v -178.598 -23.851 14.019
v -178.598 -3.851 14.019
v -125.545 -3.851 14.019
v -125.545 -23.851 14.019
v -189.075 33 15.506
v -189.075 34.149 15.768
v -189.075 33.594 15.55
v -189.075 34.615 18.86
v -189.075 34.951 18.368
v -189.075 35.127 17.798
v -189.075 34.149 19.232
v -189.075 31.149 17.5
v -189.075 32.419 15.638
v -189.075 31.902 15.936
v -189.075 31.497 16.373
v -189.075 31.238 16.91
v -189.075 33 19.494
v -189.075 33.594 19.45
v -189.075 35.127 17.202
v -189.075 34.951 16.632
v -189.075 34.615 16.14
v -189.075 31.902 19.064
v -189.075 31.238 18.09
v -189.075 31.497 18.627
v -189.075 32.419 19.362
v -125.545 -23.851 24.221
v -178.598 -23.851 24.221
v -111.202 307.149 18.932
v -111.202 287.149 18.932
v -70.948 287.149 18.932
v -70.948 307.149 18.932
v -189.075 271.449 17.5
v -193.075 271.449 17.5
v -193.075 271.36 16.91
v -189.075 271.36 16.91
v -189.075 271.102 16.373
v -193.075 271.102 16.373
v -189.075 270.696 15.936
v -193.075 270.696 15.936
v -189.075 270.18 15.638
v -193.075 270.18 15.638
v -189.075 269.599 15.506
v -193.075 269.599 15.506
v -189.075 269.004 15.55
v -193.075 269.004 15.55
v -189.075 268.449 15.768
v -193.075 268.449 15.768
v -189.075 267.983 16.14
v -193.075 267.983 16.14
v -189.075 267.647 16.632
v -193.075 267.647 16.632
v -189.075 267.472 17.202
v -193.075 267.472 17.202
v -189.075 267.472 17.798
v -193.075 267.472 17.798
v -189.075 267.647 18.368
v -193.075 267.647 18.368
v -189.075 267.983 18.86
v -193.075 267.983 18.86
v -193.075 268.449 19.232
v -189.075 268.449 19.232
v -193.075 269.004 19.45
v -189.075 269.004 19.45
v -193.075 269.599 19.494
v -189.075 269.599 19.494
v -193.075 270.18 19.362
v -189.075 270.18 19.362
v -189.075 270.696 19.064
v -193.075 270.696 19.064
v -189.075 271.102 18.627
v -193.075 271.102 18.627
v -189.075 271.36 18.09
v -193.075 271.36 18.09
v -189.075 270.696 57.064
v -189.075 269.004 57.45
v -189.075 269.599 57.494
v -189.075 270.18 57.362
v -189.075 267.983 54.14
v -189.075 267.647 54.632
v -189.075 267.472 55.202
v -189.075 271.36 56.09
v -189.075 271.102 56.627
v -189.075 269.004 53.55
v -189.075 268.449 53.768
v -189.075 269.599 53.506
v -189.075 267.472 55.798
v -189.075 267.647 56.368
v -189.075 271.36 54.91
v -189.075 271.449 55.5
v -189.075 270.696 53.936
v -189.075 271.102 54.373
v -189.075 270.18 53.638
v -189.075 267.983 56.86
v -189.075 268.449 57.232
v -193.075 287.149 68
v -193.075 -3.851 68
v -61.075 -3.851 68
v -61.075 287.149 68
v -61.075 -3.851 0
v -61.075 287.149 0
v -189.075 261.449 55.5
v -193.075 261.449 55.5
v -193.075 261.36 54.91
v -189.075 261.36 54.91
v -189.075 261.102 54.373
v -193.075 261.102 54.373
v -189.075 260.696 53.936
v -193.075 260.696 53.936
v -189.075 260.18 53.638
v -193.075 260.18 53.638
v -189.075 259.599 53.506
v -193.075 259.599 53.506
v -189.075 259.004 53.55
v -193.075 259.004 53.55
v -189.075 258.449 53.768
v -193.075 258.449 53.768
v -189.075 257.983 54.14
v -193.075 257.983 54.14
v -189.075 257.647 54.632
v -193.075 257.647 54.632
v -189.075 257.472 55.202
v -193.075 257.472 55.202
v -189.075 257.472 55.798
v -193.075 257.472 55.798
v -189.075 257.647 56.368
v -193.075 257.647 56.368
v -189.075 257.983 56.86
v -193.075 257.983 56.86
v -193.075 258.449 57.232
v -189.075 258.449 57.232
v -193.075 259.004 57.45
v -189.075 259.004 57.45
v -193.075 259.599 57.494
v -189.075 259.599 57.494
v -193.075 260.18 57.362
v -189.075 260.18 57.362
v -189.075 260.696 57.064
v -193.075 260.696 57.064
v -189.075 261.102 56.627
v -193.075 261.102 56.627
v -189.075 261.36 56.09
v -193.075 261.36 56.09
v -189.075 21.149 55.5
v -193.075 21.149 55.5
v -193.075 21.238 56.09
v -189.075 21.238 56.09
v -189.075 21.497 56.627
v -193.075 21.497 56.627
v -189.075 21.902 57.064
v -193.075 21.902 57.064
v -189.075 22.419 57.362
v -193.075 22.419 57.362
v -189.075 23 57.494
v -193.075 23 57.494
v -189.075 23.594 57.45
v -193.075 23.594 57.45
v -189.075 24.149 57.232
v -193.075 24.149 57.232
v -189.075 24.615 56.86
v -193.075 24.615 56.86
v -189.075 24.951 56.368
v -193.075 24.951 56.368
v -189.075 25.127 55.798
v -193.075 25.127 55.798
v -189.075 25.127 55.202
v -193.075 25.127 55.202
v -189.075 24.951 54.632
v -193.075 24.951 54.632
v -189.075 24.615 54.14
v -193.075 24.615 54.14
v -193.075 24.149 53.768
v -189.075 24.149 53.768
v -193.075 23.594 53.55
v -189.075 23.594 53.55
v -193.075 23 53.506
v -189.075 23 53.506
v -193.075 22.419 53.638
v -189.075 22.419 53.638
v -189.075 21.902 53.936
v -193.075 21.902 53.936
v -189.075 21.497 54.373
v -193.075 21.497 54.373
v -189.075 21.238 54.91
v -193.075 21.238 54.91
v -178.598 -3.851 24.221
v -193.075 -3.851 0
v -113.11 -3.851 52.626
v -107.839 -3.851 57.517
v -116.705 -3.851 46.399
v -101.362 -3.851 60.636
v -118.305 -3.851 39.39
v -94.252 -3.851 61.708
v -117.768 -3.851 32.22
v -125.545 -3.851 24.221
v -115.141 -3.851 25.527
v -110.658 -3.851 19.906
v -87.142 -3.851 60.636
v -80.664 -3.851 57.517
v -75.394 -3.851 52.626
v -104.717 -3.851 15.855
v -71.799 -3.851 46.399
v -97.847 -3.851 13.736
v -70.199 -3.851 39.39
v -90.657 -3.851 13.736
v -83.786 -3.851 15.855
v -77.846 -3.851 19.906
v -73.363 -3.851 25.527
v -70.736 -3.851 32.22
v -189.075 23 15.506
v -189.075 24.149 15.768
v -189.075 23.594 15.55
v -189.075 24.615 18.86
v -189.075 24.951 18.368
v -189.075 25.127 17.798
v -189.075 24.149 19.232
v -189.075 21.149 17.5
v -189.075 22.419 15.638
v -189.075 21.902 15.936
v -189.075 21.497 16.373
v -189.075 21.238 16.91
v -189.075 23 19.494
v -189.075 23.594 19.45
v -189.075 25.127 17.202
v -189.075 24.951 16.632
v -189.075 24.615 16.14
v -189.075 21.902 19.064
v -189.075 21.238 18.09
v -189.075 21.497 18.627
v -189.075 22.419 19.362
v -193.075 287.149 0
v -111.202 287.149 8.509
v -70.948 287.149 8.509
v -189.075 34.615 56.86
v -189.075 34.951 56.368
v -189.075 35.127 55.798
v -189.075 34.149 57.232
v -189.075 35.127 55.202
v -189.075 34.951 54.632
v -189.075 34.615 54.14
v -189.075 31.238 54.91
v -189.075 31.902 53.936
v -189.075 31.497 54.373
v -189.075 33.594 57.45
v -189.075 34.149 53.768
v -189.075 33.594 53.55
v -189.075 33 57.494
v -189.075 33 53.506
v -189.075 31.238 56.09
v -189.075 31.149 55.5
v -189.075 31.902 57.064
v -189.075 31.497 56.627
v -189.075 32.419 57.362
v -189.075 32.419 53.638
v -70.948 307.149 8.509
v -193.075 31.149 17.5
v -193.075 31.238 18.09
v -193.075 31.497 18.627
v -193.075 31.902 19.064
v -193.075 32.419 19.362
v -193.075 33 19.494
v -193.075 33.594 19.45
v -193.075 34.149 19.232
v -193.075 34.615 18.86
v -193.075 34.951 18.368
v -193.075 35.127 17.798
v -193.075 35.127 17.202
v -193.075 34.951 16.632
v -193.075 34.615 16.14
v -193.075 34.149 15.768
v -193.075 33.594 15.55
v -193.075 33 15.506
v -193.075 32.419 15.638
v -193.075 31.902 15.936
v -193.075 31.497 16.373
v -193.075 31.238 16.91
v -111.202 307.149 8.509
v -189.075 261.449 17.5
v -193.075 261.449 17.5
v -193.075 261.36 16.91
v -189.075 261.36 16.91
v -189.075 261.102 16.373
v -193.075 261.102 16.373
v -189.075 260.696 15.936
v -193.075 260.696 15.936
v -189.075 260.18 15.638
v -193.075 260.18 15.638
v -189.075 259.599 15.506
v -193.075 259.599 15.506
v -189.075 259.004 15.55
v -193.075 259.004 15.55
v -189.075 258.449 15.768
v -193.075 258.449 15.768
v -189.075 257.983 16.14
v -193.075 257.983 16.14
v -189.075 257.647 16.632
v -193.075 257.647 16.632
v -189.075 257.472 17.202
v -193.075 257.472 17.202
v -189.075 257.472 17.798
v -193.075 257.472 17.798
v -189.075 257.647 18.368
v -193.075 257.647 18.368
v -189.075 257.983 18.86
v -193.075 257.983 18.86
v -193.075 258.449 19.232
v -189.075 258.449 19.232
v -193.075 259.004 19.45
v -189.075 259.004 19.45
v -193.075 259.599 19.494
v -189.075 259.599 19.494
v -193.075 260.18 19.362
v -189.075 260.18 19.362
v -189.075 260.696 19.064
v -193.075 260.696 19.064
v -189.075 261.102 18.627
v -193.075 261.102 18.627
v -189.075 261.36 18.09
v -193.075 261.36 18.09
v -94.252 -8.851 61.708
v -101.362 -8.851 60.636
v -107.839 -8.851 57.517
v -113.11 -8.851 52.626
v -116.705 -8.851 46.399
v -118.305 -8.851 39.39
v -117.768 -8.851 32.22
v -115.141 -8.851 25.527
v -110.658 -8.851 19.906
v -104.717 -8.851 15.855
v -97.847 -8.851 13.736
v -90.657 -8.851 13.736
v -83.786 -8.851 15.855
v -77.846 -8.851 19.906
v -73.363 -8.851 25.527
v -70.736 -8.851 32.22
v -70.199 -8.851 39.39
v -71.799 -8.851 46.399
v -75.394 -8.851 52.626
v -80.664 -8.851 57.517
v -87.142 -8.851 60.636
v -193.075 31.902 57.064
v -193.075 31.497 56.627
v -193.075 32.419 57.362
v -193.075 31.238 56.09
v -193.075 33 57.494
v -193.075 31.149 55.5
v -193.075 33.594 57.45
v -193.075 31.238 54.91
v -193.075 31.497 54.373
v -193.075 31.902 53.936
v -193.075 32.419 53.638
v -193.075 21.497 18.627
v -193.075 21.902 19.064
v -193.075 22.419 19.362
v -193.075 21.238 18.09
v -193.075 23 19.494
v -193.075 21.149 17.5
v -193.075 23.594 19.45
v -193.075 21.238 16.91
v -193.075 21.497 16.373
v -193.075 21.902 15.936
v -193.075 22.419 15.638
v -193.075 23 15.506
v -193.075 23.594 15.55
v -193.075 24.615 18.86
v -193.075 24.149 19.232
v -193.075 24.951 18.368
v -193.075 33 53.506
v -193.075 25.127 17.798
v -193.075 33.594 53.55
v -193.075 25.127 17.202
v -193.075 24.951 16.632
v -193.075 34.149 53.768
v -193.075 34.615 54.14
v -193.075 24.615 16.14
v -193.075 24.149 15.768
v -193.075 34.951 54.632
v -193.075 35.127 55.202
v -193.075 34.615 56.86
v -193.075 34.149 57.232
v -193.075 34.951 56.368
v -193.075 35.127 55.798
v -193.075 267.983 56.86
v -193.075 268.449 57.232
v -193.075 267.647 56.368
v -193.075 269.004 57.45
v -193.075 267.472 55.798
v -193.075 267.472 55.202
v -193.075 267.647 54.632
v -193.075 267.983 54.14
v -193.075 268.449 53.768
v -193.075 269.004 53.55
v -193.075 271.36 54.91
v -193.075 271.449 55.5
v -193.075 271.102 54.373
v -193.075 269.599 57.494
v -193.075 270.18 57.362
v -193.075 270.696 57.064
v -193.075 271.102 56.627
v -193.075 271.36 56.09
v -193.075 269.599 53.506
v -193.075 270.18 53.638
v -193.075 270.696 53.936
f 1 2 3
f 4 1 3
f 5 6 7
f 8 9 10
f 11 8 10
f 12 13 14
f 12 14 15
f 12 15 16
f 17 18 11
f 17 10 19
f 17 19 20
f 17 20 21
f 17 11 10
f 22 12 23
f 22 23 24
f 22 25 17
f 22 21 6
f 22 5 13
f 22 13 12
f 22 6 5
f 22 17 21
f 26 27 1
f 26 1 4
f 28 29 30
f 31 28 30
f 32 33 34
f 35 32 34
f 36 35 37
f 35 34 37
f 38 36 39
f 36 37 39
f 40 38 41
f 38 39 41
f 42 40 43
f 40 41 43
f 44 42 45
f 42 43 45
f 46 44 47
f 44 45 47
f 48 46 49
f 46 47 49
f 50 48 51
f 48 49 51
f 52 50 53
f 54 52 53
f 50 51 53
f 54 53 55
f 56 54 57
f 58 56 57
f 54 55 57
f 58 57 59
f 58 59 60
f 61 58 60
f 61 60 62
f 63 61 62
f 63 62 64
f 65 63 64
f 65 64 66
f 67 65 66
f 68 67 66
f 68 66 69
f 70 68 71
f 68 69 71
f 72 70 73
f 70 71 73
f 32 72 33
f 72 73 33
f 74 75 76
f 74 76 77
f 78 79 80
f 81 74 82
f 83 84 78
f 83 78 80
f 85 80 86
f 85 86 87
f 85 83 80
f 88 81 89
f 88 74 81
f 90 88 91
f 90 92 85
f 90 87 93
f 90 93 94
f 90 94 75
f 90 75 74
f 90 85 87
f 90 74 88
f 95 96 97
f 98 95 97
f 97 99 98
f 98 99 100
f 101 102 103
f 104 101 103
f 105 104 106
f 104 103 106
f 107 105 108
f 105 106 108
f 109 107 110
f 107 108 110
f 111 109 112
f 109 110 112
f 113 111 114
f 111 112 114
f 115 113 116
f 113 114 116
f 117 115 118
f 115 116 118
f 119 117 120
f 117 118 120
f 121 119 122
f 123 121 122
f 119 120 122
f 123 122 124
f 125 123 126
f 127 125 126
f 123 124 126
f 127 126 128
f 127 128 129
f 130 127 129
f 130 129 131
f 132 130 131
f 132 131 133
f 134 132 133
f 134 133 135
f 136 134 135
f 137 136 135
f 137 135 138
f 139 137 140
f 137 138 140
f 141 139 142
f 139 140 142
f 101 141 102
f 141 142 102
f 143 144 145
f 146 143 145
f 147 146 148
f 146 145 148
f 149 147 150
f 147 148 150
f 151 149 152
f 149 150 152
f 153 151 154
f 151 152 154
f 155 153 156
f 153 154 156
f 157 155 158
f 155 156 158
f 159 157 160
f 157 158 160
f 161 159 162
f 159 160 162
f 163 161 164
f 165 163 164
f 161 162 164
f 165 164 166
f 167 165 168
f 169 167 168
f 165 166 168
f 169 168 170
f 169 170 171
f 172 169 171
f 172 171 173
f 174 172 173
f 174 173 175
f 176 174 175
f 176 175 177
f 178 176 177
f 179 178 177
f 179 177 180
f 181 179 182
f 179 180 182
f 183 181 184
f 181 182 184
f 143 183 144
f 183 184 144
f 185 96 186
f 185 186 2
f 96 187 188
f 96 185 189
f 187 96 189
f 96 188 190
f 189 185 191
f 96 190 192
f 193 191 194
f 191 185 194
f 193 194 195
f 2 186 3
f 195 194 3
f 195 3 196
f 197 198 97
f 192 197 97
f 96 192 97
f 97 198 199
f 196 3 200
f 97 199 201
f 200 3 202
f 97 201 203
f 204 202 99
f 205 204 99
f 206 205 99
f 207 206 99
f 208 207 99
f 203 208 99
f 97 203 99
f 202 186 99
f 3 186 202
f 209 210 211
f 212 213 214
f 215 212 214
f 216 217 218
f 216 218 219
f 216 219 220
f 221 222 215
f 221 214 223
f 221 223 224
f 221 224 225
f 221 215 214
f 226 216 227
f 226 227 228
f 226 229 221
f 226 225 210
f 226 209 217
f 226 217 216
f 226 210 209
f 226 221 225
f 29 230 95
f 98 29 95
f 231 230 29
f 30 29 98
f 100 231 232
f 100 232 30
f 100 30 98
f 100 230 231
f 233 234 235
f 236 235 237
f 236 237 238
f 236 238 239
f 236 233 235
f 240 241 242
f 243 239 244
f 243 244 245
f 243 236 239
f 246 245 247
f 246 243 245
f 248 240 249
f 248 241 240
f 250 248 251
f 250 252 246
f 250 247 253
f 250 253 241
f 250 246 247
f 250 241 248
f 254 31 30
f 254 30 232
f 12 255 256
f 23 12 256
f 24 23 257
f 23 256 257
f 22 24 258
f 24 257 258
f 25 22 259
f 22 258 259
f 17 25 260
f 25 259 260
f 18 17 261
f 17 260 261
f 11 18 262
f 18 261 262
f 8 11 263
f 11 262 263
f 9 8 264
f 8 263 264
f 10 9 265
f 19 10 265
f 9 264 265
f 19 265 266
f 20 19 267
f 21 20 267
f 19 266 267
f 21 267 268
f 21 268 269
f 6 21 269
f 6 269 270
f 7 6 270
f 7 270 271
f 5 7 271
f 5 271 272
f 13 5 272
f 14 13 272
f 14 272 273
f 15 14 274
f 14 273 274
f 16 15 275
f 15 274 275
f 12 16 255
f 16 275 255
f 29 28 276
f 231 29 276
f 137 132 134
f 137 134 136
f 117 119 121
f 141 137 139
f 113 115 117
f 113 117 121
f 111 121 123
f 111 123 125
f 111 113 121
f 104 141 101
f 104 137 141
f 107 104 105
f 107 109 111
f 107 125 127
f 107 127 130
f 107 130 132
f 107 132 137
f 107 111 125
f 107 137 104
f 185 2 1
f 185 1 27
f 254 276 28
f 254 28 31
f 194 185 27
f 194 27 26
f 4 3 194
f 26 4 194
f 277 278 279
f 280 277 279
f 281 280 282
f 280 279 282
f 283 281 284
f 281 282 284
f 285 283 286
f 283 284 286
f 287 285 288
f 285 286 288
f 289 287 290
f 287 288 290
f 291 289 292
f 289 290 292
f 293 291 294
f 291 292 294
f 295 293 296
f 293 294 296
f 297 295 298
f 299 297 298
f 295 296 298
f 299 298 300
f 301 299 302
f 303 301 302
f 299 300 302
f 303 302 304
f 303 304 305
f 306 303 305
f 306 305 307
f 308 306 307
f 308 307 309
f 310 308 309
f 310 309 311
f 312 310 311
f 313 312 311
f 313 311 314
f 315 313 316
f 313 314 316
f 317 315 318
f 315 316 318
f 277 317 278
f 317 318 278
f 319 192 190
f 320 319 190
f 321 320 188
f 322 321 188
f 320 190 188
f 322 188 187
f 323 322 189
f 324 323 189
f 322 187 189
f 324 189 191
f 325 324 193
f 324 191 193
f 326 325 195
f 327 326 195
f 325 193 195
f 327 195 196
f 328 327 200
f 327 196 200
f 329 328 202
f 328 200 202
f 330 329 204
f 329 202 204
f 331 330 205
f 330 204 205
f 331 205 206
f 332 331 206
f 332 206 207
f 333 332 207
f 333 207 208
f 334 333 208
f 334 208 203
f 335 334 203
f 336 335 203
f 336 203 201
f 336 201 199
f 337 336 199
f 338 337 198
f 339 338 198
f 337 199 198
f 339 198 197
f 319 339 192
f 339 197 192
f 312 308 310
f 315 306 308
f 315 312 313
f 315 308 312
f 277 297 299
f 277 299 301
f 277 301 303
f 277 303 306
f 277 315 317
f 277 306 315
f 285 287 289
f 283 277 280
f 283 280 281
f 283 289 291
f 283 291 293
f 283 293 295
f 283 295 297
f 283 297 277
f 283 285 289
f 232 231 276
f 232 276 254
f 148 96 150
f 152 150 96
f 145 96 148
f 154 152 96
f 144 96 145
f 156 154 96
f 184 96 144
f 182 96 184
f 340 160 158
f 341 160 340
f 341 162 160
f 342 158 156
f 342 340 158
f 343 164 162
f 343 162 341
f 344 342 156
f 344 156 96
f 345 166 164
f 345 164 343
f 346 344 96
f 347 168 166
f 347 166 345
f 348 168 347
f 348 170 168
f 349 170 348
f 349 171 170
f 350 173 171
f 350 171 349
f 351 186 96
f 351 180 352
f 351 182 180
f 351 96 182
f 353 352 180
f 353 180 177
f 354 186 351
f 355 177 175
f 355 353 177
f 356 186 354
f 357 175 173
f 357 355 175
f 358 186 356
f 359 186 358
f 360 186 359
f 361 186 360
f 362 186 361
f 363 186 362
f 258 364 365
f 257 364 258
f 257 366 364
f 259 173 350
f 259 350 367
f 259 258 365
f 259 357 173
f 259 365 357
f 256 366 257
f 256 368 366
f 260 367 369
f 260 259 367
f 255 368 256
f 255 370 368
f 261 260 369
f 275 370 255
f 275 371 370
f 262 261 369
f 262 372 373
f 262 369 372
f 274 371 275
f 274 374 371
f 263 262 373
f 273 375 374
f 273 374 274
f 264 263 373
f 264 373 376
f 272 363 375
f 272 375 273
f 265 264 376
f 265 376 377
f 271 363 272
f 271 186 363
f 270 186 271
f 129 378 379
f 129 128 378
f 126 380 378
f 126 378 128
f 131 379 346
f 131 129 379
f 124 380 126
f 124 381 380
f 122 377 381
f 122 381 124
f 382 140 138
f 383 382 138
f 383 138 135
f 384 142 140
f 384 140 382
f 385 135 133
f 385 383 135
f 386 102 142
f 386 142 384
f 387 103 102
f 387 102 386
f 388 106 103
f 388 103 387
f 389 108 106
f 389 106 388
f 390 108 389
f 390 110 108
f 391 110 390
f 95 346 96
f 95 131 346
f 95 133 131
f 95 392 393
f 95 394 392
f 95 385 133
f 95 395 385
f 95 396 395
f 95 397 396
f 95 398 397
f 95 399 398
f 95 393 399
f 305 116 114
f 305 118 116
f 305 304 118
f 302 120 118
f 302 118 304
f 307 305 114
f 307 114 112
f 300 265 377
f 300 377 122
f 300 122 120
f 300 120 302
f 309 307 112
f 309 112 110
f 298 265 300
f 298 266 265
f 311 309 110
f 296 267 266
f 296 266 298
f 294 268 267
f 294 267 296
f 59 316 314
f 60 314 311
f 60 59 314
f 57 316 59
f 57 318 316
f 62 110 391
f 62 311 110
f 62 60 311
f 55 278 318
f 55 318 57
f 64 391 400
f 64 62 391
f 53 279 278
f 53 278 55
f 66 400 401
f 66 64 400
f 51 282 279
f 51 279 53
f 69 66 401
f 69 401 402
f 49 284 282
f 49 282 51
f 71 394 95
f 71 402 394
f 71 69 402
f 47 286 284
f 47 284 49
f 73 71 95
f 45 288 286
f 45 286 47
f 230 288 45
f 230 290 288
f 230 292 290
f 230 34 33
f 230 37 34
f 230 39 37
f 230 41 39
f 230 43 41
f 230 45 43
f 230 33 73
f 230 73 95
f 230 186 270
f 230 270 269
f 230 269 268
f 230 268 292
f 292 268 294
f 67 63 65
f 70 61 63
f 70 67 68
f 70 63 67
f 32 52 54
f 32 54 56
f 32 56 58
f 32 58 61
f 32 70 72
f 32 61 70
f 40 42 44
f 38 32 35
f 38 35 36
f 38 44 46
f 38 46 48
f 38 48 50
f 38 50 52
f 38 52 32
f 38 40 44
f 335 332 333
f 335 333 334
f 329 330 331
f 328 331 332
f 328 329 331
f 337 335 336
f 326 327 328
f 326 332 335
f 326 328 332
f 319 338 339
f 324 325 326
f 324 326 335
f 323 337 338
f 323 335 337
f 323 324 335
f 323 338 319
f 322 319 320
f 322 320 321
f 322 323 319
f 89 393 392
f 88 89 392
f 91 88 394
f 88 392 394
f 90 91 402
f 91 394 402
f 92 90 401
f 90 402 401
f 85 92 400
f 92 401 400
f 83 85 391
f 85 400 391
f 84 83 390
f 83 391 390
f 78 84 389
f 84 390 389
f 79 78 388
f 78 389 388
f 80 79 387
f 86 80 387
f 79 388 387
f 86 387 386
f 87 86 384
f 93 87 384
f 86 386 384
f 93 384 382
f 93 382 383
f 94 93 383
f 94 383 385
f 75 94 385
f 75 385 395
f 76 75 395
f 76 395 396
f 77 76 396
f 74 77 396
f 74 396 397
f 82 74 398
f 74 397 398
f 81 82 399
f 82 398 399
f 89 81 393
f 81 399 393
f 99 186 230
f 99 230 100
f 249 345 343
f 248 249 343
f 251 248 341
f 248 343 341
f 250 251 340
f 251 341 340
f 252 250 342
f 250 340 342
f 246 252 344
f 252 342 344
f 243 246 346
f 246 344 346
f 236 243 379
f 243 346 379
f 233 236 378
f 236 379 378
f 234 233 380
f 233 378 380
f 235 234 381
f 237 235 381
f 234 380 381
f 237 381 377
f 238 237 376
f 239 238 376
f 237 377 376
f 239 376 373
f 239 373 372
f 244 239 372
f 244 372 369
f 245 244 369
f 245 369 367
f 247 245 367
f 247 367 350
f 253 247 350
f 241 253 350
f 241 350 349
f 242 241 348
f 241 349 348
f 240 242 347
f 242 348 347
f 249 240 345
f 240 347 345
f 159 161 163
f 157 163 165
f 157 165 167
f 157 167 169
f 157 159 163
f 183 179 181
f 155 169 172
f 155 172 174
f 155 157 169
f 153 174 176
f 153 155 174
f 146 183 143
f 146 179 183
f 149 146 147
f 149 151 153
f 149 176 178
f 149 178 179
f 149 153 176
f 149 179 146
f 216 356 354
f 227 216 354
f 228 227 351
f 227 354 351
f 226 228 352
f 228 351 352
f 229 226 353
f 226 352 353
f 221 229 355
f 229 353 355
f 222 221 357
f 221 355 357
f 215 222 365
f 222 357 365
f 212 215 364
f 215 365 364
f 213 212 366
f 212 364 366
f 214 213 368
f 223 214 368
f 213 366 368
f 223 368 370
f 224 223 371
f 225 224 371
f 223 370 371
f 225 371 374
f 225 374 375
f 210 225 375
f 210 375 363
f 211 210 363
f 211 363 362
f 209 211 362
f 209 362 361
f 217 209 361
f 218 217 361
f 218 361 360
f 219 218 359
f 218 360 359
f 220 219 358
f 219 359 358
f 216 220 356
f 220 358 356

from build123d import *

# Parameters (mm, degrees)
SKETCH_1_W          = 132
SKETCH_1_H          = 291
EXTRUDE_1_DEPTH     = 68
SKETCH_2_R          = 2
CUT_EXTRUDE_1_DEPTH = 4
SKETCH_3_W          = 53.053280534
SKETCH_3_H          = 10.202175613
EXTRUDE_2_DEPTH     = 20
SKETCH_4_R          = 24.120605075
EXTRUDE_3_DEPTH     = 5
SKETCH_5_W          = 40.253809201
SKETCH_5_H          = 10.422389964
EXTRUDE_4_DEPTH     = 20


with BuildPart() as part:
    # 草图1 → 凸台-拉伸1 (new body)
    with BuildSketch(Plane.XY):
        with Locations((-127.074626866, 141.649253731)):
            Rectangle(SKETCH_1_W, SKETCH_1_H)
    extrude(amount=EXTRUDE_1_DEPTH)

    # 草图2 → 切除-拉伸1 (cut)
    with BuildSketch(Plane.ZY.offset(193.074626866)):
        with Locations(Location((17.5, 23.149253731, 0), (0, 0, 270))):
            Circle(SKETCH_2_R)
        with Locations(Location((55.5, 23.149253731, 0), (0, 0, 270))):
            Circle(SKETCH_2_R)
        with Locations(Location((55.5, 33.149253731, 0), (0, 0, 270))):
            Circle(SKETCH_2_R)
        with Locations(Location((17.5, 33.149253731, 0), (0, 0, 270))):
            Circle(SKETCH_2_R)
        with Locations(Location((17.5, 269.449253731, 0), (0, 0, 90))):
            Circle(SKETCH_2_R)
        with Locations(Location((17.5, 259.449253731, 0), (0, 0, 90))):
            Circle(SKETCH_2_R)
        with Locations(Location((55.5, 259.449253731, 0), (0, 0, 90))):
            Circle(SKETCH_2_R)
        with Locations(Location((55.5, 269.449253731, 0), (0, 0, 90))):
            Circle(SKETCH_2_R)
    extrude(amount=-CUT_EXTRUDE_1_DEPTH, mode=Mode.SUBTRACT)

    # 草图3 → 凸台-拉伸2 (add)
    with BuildSketch(Plane.XZ.offset(3.850746269)):
        with Locations((-152.07170966, 19.120276631)):
            Rectangle(SKETCH_3_W, SKETCH_3_H)
    extrude(amount=EXTRUDE_2_DEPTH)

    # 草图4 → 凸台-拉伸3 (add)
    with BuildSketch(Plane.XZ.offset(3.850746269)):
        with Locations(Location((-94.251857707, 37.587190062, 0), (0, 0, 90))):
            Circle(SKETCH_4_R)
    extrude(amount=EXTRUDE_3_DEPTH)

    # 草图5 → 凸台-拉伸4 (add)
    with BuildSketch(Plane(origin=(0, 287.149253731, 0), x_dir=(1, 0, 0), z_dir=(0, 1, 0))):
        with Locations((-91.075289647, -13.720381028)):
            Rectangle(SKETCH_5_W, SKETCH_5_H)
    extrude(amount=EXTRUDE_4_DEPTH)


solid = part.part
